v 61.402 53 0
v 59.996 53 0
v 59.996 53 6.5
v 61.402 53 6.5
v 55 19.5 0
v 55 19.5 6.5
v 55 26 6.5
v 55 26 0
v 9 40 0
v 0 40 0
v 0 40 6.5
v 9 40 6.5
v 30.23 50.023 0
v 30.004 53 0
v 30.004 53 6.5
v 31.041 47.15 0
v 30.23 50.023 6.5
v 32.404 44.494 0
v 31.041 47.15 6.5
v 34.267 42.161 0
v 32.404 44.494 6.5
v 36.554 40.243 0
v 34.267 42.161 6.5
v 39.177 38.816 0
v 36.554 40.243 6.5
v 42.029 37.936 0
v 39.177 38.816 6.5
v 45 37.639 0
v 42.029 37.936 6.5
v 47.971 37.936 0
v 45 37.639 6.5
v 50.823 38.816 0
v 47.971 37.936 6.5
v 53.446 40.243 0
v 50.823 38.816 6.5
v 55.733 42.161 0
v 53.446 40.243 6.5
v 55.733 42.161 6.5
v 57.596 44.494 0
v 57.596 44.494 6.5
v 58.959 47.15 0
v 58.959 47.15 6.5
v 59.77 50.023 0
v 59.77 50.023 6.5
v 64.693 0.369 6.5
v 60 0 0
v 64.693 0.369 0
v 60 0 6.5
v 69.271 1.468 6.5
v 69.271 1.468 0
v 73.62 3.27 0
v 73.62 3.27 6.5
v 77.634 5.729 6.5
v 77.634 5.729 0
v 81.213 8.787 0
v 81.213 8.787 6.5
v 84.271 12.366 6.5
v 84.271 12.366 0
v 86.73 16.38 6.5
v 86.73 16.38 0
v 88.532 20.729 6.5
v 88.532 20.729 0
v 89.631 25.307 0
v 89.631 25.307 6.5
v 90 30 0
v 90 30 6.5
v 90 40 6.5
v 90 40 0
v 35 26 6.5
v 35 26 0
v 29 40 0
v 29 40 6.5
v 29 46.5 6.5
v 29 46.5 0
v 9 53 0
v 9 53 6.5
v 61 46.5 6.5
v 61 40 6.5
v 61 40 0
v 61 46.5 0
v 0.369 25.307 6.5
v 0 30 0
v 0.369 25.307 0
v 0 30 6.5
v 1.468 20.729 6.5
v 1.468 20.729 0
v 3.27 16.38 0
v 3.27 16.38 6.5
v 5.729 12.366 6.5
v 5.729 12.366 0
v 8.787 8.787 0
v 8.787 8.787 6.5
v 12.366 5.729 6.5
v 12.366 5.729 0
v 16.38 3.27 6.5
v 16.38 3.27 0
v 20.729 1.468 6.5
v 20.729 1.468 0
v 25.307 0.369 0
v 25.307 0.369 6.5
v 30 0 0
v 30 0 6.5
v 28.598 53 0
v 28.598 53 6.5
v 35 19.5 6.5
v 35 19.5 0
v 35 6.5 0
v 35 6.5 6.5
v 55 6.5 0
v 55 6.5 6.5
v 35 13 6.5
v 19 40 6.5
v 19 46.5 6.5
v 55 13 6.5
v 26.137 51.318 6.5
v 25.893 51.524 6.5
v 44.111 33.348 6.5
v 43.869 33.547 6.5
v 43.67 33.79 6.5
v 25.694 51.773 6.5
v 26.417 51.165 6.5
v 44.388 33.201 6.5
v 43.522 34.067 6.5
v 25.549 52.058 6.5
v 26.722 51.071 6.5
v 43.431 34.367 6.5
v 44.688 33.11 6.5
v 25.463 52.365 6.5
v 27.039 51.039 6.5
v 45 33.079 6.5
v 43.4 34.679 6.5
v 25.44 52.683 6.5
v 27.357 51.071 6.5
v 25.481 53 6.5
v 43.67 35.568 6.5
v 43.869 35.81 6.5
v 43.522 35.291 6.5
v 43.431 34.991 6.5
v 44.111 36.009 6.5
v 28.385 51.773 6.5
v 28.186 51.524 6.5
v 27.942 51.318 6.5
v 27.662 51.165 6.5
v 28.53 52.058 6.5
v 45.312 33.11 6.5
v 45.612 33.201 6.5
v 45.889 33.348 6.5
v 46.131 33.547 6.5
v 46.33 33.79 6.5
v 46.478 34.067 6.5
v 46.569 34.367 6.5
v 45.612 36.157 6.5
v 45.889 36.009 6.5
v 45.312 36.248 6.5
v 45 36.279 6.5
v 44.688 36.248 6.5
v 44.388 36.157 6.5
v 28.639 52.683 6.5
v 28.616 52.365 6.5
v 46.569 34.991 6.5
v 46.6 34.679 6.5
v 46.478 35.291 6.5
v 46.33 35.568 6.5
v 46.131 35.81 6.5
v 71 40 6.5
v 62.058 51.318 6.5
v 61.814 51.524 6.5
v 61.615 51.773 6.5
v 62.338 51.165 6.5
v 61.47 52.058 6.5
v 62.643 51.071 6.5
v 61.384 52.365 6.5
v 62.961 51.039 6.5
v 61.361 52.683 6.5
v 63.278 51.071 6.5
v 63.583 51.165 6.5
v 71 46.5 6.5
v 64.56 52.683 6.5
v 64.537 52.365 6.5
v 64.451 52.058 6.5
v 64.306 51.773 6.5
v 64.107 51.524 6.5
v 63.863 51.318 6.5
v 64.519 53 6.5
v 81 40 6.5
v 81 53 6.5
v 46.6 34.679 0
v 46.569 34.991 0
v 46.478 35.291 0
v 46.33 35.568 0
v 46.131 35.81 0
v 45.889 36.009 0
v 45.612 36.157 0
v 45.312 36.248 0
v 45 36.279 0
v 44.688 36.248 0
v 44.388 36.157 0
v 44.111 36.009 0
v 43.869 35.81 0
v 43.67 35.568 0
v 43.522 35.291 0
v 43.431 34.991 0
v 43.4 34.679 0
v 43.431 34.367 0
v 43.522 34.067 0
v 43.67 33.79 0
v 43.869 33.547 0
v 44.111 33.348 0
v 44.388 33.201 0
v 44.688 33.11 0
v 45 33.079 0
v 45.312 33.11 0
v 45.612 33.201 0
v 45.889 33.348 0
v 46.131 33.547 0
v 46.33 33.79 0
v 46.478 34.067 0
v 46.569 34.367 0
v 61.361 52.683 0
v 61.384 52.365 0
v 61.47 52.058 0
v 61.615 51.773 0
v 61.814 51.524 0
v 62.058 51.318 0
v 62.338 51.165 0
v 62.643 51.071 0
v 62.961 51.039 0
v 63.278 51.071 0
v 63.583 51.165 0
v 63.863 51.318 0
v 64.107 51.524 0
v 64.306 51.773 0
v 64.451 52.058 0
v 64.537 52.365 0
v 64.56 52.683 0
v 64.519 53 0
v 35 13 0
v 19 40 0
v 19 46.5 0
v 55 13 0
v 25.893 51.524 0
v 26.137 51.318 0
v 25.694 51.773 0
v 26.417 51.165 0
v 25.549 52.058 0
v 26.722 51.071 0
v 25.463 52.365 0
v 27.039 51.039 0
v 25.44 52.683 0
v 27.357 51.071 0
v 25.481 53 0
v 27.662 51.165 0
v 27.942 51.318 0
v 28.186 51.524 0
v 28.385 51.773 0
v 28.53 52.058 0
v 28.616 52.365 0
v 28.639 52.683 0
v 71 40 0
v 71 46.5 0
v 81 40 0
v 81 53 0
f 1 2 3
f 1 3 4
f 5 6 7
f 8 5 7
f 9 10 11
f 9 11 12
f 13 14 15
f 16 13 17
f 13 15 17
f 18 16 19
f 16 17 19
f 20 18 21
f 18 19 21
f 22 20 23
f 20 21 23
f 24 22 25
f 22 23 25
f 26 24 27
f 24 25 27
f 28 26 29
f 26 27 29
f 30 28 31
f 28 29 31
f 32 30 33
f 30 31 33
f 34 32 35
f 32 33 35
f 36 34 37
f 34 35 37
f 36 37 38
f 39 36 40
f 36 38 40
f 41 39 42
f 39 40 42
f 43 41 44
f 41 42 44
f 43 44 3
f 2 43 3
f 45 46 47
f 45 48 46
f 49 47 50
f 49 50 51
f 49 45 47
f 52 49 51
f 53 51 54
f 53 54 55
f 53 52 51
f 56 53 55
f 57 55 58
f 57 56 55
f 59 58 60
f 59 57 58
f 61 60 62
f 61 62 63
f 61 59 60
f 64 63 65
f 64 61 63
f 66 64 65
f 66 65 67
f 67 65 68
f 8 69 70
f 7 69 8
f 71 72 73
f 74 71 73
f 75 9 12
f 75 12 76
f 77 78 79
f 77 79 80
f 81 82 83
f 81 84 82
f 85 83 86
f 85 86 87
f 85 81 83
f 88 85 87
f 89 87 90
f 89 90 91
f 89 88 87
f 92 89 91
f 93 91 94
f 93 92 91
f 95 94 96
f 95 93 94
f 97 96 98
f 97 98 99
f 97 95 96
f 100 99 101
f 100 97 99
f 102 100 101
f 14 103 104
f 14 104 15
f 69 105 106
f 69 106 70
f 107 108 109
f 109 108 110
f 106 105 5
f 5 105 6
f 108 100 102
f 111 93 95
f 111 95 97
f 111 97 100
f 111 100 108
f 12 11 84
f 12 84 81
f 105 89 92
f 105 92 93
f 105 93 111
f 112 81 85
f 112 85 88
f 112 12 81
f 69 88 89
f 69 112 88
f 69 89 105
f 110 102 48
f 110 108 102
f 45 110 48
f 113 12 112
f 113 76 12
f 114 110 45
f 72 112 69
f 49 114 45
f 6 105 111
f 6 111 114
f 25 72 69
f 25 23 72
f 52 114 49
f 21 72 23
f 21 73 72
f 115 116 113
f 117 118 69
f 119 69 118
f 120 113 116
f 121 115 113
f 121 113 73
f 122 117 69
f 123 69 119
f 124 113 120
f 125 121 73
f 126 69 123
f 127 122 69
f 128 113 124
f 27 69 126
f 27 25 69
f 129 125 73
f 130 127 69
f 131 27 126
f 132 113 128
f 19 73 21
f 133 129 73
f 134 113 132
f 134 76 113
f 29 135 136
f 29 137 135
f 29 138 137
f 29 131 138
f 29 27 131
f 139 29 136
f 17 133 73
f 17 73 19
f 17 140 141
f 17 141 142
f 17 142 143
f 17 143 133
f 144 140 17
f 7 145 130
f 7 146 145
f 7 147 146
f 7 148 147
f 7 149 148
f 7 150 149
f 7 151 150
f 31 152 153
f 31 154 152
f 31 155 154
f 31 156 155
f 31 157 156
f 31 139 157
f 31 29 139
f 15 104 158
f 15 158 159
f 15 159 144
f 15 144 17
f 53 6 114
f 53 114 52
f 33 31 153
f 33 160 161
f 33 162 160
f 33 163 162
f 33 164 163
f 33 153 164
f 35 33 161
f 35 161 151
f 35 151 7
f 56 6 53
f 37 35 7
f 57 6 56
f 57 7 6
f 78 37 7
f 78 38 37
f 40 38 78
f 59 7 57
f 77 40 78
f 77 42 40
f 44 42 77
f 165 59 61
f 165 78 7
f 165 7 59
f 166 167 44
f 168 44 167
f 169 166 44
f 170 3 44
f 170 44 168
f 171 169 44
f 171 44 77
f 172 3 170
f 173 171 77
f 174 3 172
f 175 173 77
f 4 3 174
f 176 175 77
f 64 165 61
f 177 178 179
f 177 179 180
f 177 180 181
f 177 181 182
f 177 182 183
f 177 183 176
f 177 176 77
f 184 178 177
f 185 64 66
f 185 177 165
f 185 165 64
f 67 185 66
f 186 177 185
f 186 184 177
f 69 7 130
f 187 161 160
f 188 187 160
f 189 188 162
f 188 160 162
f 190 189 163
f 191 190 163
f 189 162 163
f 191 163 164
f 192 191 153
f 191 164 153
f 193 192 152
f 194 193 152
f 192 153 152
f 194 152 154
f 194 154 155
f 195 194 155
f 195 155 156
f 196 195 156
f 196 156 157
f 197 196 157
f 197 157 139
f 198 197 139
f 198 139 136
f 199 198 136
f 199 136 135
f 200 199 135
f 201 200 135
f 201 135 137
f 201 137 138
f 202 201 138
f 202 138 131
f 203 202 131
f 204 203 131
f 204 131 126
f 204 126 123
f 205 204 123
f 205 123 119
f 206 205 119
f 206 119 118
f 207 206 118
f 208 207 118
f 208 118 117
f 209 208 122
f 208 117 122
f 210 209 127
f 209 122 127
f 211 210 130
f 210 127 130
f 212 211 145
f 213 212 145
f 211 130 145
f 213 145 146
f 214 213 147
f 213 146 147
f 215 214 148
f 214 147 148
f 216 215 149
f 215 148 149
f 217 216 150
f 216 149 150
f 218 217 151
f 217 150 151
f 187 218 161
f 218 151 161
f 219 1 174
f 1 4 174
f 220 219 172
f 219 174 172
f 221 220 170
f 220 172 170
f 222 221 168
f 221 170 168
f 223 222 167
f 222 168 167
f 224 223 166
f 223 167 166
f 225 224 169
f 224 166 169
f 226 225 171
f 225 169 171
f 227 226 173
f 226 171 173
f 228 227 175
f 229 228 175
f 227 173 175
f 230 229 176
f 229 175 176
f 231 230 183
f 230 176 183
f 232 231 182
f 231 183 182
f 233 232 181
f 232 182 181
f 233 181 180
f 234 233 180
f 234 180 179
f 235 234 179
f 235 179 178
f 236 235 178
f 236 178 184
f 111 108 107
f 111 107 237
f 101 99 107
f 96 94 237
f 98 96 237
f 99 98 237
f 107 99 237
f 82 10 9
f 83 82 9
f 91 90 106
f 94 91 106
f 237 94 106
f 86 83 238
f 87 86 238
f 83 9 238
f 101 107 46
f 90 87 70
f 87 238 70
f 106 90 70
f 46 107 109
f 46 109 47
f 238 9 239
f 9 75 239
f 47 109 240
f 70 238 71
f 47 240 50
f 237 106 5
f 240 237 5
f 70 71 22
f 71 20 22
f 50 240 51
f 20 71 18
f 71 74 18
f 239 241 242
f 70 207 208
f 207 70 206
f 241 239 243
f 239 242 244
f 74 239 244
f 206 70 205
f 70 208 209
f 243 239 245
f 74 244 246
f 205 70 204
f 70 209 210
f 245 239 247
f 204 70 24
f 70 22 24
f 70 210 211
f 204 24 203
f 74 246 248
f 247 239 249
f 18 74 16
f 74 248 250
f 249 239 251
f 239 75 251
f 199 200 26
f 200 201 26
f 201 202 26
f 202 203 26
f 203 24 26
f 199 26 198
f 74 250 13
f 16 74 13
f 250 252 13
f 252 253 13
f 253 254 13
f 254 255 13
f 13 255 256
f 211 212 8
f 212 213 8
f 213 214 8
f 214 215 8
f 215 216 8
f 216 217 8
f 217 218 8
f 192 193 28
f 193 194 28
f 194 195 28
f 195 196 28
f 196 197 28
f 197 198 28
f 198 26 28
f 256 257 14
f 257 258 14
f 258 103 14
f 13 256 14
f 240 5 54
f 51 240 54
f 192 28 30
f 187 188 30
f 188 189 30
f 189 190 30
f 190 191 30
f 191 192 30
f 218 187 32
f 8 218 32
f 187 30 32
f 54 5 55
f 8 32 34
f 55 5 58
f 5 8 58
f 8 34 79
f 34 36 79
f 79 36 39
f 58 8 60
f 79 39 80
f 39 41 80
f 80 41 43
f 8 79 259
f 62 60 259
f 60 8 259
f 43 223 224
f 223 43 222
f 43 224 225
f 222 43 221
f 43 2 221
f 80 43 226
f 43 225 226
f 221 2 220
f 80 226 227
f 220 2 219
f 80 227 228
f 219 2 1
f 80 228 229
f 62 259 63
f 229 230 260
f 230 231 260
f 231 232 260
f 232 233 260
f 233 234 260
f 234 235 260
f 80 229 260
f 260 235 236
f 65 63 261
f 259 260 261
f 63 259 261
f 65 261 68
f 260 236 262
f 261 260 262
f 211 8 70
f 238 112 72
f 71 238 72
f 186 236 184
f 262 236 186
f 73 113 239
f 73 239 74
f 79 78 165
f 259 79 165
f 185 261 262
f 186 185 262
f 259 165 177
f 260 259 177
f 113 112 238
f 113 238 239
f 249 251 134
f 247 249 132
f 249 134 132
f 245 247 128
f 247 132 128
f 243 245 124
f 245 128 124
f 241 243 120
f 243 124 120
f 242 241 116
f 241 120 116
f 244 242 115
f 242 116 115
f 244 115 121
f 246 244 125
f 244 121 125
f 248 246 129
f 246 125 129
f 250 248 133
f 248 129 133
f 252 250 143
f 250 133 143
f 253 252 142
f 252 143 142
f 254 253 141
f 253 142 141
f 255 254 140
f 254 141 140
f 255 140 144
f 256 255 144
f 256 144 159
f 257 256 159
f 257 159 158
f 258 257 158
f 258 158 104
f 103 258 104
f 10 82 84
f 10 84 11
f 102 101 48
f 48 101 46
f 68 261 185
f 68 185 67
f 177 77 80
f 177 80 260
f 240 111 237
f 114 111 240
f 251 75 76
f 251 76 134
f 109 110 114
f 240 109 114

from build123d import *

# Parameters (mm, degrees)
SKETCH1_W                  = 72
SKETCH1_H                  = 13
SKETCH1_W_2                = 90
SKETCH1_H_2                = 40
BOSS_EXTRUDE1_DEPTH        = 6.5
FILLET2_R                  = 30
SKETCH2_R                  = 15
SKETCH2_R_2                = 1.6
MOTOR_CLEARANCE_DEPTH      = 105.648220243
CUT_SIDE_WHEEL_HOLES_REACH = 106.648
SKETCH3_W                  = 10
SKETCH3_H                  = 6.5
CUT_EXTRUDE1_REACH         = 106.648
SKETCH5_W                  = 20
SKETCH5_H                  = 6.5


with BuildPart() as part:
    # Sketch1 → Boss-Extrude1 (new body)
    with BuildSketch(Plane.XY):
        with Locations((45, 46.5)):
            Rectangle(SKETCH1_W, SKETCH1_H)
        with Locations((45, 20)):
            Rectangle(SKETCH1_W_2, SKETCH1_H_2)
    extrude(amount=BOSS_EXTRUDE1_DEPTH)

    # Fillet2
    fillet2_edges = [part.edges().sort_by_distance(p)[0] for p in [
        (90, 0, 3.25),
        (0, 0, 3.25),
    ]]
    fillet(fillet2_edges, radius=FILLET2_R)

    # Sketch2 → motor clearance (cut, through all)
    with BuildSketch(Plane.XY.offset(6.5)):
        with Locations((45, 52.639320225)):
            Circle(SKETCH2_R)
        with Locations((62.960512242, 52.639320225)):
            Circle(SKETCH2_R_2)
        with Locations((45, 34.678807983)):
            Circle(SKETCH2_R_2)
        with Locations((27.039487758, 52.639320225)):
            Circle(SKETCH2_R_2)
    extrude(amount=-MOTOR_CLEARANCE_DEPTH, mode=Mode.SUBTRACT)

    # Sketch3 → cut side wheel holes (cut, up to next)
    with BuildSketch(Plane.XY.offset(6.5), mode=Mode.PRIVATE) as cut_side_wheel_holes_sk1:
        with Locations((24, 43.25)):
            Rectangle(SKETCH3_W, SKETCH3_H)
    cut_side_wheel_holes_tool1 = extrude(cut_side_wheel_holes_sk1.sketch, amount=-CUT_SIDE_WHEEL_HOLES_REACH, mode=Mode.PRIVATE) & part.part
    # Sketch3 → cut side wheel holes (cut, up to next)
    with BuildSketch(Plane.XY.offset(6.5), mode=Mode.PRIVATE) as cut_side_wheel_holes_sk2:
        with Locations((66, 43.25)):
            Rectangle(SKETCH3_W, SKETCH3_H)
    cut_side_wheel_holes_tool2 = extrude(cut_side_wheel_holes_sk2.sketch, amount=-CUT_SIDE_WHEEL_HOLES_REACH, mode=Mode.PRIVATE) & part.part
    add(cut_side_wheel_holes_tool1.solids().sort_by_distance((24, 43.25, 6.5))[0], mode=Mode.SUBTRACT)
    add(cut_side_wheel_holes_tool2.solids().sort_by_distance((66, 43.25, 6.5))[0], mode=Mode.SUBTRACT)

    # Sketch5 → Cut-Extrude1 (cut, up to next)
    with BuildSketch(Plane.XY.offset(6.5), mode=Mode.PRIVATE) as cut_extrude1_sk1:
        with Locations((45, 22.75)):
            Rectangle(SKETCH5_W, SKETCH5_H)
    cut_extrude1_tool1 = extrude(cut_extrude1_sk1.sketch, amount=-CUT_EXTRUDE1_REACH, mode=Mode.PRIVATE) & part.part
    # Sketch5 → Cut-Extrude1 (cut, up to next)
    with BuildSketch(Plane.XY.offset(6.5), mode=Mode.PRIVATE) as cut_extrude1_sk2:
        with Locations((45, 9.75)):
            Rectangle(SKETCH5_W, SKETCH5_H)
    cut_extrude1_tool2 = extrude(cut_extrude1_sk2.sketch, amount=-CUT_EXTRUDE1_REACH, mode=Mode.PRIVATE) & part.part
    add(cut_extrude1_tool1.solids().sort_by_distance((45, 22.75, 6.5))[0], mode=Mode.SUBTRACT)
    add(cut_extrude1_tool2.solids().sort_by_distance((45, 9.75, 6.5))[0], mode=Mode.SUBTRACT)


solid = part.part
